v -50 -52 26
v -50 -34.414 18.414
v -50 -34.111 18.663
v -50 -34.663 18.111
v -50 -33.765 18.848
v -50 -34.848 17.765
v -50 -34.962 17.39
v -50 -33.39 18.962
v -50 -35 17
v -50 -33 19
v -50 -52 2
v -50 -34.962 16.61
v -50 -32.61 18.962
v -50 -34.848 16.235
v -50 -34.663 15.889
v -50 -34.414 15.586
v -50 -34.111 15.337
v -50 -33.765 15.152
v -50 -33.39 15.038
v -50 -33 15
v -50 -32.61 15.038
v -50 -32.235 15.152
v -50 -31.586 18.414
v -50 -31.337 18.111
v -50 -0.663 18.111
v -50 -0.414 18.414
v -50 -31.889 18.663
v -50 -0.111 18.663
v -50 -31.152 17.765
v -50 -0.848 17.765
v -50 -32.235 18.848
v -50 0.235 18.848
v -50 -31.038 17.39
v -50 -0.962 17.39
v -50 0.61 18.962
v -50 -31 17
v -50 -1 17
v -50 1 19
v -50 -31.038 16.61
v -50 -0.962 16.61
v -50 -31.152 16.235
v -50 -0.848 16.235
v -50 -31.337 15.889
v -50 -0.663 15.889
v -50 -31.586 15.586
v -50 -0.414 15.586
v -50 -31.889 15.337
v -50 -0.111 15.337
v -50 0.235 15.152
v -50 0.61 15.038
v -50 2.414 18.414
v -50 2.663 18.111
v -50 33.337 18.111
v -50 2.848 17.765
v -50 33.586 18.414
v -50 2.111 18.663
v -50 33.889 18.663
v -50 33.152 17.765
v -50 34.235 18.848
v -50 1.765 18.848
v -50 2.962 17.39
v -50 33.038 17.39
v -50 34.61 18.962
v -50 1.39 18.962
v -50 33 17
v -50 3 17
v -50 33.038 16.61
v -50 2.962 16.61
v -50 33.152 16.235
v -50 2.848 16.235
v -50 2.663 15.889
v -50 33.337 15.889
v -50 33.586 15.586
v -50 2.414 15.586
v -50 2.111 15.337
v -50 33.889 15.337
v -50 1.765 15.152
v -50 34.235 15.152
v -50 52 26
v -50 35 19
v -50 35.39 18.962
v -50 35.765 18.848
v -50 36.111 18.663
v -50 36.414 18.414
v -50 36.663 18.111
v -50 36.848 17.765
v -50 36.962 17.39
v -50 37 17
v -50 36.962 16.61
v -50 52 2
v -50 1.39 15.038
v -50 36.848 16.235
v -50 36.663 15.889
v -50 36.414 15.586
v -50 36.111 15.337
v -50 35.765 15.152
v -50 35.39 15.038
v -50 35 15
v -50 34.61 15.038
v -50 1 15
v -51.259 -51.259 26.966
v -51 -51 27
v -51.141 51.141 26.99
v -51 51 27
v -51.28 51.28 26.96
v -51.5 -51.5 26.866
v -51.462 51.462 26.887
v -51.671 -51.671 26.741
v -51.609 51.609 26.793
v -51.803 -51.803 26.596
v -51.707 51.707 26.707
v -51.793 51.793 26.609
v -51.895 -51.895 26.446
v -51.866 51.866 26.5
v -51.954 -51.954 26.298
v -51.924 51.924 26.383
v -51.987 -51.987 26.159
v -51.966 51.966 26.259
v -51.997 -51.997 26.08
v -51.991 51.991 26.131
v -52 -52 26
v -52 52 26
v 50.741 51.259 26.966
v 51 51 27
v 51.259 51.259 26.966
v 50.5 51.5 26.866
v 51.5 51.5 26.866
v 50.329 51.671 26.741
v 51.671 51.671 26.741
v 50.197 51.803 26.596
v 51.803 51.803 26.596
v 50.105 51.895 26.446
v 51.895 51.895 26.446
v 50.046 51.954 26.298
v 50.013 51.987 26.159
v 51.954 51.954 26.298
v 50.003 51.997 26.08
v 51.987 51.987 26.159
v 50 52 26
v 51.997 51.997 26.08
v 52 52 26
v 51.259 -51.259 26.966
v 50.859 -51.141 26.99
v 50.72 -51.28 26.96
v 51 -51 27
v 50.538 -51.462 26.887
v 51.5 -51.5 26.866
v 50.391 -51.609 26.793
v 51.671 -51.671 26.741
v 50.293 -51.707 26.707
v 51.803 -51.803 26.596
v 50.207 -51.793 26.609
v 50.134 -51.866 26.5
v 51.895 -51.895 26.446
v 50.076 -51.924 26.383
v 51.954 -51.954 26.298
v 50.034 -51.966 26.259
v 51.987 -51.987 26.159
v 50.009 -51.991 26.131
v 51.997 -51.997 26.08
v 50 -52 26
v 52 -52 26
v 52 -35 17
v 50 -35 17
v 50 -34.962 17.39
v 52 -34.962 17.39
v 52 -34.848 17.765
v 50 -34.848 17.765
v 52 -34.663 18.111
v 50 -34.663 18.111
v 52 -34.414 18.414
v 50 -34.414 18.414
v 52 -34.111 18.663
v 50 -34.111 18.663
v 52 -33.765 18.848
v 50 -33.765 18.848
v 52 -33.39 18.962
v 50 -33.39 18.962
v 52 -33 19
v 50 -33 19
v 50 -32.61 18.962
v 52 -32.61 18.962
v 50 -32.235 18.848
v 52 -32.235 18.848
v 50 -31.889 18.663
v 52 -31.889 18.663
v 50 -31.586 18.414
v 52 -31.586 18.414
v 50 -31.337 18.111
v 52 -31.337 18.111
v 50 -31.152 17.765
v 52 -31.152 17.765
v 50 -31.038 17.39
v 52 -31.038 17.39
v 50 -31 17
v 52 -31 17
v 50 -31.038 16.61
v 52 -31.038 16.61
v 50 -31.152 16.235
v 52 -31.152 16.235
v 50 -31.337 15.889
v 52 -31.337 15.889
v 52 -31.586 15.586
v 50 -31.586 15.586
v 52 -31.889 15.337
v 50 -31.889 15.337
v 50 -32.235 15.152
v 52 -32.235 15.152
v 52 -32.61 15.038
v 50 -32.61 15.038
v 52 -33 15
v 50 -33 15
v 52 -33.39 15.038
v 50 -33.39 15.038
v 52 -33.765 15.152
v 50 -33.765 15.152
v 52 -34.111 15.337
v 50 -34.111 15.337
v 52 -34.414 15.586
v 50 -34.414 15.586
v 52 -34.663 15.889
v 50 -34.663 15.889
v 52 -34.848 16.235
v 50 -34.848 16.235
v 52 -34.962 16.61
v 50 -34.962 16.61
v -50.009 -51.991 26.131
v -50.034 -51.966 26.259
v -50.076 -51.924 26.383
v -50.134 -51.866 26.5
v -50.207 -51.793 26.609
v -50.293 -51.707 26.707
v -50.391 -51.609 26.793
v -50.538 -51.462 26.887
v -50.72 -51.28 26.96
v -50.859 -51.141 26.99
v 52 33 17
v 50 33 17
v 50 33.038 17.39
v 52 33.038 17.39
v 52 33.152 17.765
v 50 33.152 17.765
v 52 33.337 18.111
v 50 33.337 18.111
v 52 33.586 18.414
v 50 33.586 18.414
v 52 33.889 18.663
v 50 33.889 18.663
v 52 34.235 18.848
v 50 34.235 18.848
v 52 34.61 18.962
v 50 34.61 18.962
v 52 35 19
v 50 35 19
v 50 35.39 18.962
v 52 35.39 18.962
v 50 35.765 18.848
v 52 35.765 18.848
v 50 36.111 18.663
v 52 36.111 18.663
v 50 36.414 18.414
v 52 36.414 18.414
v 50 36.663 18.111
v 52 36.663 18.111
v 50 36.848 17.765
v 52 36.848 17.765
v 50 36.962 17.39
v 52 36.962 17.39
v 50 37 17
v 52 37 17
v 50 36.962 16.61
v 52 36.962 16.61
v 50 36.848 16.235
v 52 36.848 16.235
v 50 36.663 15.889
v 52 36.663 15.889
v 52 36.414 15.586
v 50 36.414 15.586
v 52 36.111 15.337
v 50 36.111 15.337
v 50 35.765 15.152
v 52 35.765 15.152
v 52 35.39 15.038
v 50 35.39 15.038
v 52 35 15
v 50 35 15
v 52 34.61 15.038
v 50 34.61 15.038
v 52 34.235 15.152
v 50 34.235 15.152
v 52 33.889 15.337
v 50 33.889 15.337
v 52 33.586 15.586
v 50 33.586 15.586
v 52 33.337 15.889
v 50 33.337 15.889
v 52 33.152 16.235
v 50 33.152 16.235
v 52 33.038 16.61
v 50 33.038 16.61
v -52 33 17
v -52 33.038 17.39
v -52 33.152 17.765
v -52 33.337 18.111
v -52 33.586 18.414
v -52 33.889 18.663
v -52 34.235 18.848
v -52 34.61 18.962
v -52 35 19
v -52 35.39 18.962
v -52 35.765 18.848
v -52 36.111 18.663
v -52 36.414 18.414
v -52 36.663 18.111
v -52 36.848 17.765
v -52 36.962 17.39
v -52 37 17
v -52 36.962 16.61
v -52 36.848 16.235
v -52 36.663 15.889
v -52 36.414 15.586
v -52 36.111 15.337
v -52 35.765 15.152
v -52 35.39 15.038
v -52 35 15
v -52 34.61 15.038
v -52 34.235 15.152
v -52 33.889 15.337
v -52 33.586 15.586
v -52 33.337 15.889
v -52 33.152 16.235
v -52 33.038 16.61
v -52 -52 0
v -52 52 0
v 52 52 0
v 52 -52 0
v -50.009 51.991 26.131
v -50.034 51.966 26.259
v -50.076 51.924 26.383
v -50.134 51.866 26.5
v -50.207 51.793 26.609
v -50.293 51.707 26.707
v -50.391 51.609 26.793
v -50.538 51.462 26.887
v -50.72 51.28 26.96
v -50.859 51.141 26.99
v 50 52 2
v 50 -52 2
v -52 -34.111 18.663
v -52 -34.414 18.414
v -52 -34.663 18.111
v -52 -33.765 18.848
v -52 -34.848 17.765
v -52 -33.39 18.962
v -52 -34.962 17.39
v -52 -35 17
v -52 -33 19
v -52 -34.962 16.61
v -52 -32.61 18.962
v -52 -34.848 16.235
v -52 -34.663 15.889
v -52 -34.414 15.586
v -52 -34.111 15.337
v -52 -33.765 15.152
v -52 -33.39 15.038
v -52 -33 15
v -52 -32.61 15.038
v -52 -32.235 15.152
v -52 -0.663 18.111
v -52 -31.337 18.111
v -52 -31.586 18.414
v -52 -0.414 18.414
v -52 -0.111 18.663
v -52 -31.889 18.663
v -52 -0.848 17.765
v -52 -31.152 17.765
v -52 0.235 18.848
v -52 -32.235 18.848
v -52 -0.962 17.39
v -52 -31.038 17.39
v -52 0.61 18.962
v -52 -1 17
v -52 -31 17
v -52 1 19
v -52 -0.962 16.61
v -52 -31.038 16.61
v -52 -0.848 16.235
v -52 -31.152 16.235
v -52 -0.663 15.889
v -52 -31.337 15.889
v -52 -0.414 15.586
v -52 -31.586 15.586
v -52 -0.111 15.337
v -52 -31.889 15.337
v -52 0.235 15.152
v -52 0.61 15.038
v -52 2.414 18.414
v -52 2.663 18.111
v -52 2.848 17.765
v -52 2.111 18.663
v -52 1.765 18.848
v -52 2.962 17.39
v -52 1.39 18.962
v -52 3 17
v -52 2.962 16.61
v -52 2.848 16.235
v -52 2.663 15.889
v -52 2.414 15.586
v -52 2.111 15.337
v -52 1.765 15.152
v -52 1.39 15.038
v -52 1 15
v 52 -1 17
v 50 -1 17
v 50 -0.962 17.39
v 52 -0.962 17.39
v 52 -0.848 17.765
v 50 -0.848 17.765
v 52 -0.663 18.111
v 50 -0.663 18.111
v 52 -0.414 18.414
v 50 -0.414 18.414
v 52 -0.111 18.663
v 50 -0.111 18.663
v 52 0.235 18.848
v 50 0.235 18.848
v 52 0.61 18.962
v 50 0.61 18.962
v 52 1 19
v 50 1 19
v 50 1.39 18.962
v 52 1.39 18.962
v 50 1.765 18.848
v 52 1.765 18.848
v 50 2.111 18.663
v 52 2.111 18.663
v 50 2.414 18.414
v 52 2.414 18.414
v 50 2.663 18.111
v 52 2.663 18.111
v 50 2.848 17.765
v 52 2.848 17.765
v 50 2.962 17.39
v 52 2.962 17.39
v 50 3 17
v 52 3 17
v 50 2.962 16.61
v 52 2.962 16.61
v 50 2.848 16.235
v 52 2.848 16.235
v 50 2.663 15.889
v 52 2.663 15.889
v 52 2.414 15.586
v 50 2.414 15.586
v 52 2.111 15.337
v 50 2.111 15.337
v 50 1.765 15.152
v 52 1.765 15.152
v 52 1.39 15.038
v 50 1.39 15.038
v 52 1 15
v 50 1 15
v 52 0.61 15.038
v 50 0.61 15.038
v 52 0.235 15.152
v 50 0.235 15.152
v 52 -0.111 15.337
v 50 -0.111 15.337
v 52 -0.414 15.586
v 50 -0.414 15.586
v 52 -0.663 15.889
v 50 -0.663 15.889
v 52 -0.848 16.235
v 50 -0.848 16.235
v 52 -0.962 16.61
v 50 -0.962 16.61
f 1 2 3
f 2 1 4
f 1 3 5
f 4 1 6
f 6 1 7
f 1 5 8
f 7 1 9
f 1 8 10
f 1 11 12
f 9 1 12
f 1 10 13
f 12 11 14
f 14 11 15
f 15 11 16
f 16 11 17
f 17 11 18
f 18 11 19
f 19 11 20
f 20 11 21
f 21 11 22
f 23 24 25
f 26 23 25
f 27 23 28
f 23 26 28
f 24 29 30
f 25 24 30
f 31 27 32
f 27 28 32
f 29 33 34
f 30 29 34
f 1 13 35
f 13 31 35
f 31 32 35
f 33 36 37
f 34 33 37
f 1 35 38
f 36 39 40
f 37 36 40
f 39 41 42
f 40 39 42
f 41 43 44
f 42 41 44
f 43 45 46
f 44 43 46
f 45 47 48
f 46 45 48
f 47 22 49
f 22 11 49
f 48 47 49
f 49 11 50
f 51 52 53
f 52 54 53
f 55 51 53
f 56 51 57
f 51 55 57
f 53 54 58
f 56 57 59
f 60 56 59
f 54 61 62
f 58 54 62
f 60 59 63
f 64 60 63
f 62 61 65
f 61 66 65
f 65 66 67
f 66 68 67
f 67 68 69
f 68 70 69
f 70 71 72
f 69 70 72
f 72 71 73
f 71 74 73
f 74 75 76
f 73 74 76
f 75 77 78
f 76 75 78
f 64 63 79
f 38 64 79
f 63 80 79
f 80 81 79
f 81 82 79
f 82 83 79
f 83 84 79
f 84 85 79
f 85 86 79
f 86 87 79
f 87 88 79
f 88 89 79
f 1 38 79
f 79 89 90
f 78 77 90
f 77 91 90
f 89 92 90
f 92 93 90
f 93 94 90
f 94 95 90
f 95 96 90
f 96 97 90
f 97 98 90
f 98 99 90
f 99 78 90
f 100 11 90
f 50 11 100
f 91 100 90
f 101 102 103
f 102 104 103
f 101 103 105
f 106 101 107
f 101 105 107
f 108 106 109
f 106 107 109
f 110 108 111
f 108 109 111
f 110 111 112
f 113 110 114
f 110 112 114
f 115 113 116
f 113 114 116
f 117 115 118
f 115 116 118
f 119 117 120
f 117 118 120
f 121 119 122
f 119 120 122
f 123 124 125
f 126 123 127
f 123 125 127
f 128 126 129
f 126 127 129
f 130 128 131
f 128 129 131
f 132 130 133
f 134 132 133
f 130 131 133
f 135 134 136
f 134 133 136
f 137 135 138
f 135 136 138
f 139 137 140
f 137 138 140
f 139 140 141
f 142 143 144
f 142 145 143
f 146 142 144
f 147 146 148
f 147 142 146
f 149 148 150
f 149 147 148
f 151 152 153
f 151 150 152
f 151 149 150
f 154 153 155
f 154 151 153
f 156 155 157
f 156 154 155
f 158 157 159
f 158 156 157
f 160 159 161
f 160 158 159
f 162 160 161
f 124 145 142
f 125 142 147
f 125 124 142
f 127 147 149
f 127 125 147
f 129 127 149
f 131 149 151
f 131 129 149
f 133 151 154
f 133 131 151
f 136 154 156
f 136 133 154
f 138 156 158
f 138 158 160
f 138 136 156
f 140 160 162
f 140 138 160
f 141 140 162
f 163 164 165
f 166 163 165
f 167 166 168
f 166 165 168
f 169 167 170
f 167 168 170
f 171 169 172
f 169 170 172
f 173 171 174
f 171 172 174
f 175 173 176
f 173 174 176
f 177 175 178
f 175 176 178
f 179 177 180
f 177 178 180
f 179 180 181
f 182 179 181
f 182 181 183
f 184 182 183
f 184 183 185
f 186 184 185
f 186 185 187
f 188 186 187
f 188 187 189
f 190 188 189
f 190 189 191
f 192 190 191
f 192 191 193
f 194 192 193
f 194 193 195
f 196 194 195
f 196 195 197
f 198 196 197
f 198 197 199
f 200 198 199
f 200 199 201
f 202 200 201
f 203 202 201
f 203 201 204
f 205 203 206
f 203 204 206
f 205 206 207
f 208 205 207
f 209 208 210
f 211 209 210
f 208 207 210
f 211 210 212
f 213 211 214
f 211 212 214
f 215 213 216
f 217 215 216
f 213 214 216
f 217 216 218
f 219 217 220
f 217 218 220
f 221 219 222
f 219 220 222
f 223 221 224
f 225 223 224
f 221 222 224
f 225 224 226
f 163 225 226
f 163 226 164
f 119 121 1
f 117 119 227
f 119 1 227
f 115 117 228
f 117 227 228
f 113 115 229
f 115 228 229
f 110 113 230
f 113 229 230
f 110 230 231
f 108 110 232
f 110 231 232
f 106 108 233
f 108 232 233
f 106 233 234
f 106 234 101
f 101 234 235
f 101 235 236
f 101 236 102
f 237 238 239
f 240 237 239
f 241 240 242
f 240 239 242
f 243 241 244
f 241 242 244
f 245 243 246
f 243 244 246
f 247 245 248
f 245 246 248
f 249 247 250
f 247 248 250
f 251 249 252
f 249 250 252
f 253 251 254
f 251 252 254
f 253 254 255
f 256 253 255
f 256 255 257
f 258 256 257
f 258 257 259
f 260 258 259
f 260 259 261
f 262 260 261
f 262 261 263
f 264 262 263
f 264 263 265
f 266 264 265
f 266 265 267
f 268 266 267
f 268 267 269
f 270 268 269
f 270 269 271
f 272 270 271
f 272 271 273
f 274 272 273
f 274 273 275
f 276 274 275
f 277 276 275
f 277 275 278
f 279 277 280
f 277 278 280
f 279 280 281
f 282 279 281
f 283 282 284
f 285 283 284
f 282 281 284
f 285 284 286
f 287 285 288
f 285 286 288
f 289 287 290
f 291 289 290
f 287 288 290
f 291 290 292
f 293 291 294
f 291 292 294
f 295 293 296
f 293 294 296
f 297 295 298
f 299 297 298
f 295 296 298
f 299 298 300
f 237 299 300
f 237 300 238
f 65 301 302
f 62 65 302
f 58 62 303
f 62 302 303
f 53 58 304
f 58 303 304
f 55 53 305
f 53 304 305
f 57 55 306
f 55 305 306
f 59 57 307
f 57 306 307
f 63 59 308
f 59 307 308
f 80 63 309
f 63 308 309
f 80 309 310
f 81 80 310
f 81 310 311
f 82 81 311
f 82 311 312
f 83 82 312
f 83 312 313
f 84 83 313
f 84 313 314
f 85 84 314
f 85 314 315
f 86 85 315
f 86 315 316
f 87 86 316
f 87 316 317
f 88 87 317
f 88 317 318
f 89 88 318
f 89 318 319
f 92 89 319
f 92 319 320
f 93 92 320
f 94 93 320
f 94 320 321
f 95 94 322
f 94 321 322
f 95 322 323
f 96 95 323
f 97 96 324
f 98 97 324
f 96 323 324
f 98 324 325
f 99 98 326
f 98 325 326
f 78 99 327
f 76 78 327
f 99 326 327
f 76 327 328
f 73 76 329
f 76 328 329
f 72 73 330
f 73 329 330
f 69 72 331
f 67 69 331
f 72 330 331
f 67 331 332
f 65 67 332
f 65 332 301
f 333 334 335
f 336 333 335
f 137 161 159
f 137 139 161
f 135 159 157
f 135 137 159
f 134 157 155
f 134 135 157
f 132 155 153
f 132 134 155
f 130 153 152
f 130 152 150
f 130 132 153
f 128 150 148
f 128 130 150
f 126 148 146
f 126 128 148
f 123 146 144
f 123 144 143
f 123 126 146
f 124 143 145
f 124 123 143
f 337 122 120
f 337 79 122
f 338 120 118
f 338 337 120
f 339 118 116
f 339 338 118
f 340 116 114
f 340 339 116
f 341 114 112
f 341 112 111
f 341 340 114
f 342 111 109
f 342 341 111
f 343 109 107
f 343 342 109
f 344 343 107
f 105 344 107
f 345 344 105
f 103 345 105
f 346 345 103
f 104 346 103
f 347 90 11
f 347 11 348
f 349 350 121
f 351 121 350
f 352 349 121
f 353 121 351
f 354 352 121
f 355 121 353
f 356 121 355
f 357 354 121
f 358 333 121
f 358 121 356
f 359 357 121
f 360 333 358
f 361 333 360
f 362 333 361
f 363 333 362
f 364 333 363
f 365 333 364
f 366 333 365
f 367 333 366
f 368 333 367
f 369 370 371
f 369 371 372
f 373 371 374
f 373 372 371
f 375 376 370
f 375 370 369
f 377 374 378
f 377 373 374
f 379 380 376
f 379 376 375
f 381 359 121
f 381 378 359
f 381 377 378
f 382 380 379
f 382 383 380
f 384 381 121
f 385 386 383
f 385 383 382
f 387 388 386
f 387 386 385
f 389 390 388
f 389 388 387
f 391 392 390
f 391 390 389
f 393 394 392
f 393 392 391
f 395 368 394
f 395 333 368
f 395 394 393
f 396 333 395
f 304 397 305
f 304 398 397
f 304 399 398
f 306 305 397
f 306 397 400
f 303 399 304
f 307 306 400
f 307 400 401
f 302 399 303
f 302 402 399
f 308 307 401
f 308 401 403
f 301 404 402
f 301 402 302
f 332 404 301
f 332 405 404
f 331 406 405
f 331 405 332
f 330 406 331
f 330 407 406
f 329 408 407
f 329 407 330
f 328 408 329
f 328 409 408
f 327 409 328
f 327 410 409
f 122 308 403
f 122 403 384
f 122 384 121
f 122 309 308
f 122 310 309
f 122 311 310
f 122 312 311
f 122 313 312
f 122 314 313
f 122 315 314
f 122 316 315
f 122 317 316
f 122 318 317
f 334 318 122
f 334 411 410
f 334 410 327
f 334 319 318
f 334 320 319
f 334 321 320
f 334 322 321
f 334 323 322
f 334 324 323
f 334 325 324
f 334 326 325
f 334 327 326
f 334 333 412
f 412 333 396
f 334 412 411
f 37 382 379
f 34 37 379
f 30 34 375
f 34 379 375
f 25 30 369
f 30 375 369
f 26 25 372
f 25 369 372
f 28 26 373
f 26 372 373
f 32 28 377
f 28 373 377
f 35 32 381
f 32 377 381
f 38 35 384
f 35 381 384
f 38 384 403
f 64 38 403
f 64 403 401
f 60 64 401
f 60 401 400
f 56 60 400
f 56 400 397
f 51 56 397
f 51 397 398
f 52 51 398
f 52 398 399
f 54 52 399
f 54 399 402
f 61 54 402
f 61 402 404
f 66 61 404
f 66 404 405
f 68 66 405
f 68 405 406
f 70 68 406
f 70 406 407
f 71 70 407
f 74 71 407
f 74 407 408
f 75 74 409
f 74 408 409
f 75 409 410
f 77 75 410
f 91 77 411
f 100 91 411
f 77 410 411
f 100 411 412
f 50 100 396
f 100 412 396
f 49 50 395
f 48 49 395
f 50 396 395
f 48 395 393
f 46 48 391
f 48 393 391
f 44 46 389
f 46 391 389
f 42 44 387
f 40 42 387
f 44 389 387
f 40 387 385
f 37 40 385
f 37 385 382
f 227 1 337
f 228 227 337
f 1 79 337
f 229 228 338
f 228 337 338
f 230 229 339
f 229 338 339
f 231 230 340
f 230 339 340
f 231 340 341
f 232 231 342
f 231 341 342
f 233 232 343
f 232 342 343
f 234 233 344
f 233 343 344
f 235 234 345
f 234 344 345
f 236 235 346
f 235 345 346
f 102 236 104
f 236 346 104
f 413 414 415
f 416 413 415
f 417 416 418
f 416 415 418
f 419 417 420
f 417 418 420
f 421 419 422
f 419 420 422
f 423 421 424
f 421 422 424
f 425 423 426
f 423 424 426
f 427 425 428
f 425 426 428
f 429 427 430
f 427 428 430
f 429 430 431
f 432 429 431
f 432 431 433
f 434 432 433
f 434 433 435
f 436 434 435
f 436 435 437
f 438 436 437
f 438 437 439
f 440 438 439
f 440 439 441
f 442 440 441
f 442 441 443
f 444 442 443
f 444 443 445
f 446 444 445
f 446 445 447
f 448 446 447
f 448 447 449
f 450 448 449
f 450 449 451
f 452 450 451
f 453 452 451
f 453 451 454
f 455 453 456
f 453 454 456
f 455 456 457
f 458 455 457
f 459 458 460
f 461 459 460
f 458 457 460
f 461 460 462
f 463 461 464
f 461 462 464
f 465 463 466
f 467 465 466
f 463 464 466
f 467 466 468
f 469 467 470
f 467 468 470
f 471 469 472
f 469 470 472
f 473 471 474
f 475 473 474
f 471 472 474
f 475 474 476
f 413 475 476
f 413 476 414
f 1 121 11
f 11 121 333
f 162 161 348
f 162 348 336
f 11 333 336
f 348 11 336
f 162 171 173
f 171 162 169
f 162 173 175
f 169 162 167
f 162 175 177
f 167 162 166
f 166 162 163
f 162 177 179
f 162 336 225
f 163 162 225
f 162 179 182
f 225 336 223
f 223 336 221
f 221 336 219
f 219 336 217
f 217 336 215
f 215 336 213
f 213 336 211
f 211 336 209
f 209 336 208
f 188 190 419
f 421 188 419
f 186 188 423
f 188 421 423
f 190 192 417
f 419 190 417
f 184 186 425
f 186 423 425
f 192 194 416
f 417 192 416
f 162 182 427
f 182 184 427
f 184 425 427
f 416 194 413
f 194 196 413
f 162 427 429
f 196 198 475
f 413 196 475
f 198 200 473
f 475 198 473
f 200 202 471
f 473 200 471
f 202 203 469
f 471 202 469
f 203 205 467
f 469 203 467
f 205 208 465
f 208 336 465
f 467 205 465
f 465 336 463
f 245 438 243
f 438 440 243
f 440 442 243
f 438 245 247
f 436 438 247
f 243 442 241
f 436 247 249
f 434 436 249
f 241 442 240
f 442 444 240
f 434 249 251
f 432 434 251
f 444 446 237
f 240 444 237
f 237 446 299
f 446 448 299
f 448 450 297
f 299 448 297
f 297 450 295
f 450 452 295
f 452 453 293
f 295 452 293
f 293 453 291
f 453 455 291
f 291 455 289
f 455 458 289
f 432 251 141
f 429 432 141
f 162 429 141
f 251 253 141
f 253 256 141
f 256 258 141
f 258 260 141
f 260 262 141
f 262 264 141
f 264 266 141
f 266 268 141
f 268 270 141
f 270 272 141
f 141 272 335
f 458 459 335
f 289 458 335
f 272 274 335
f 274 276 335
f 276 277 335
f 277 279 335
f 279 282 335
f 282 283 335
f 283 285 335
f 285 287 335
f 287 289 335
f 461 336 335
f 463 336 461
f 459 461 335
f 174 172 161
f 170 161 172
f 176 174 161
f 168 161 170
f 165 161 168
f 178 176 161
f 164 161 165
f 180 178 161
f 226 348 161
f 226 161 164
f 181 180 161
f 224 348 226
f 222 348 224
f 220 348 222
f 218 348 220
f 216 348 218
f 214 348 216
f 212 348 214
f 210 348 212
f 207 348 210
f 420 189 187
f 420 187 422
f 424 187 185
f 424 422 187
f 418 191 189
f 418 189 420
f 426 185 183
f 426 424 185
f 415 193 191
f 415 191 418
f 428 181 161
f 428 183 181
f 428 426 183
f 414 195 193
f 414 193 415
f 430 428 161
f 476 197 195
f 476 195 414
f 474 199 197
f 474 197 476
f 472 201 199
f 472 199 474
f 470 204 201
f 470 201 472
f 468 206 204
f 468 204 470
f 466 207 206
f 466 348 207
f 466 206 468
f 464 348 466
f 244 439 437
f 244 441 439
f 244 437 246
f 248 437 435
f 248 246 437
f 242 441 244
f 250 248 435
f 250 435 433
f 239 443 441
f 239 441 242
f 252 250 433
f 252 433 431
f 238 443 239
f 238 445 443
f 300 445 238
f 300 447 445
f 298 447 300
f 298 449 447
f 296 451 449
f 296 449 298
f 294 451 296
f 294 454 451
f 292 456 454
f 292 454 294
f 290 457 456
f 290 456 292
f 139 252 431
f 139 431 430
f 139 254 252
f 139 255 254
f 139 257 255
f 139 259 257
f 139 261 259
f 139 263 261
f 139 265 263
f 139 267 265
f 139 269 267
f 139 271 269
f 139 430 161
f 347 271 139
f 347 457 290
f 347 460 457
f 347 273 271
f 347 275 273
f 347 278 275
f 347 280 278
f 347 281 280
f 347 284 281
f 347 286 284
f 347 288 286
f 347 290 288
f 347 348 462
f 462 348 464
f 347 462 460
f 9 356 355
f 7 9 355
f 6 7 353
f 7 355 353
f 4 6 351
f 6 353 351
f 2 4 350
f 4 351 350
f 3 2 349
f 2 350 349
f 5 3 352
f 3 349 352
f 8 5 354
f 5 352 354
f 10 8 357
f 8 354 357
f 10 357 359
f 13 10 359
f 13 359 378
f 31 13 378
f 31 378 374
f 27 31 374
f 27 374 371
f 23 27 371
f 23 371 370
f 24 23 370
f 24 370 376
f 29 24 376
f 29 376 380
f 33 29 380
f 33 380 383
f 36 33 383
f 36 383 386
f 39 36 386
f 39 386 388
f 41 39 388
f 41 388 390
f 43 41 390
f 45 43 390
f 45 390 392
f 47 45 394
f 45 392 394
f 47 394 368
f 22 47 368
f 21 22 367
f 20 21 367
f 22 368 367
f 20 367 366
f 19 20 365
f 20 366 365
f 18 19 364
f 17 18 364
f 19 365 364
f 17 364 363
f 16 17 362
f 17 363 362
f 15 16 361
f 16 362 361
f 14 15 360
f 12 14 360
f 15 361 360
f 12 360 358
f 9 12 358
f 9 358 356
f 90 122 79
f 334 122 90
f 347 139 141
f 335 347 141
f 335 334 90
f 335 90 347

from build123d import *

# Parameters (mm, degrees)
F0_W     = 104
F0_H     = 104
F1_DEPTH = 2
F2_W     = 2
F2_H     = 104
F3_DEPTH = 25
F4_W     = 2
F4_H     = 104
F5_DEPTH = 25
F6_R     = 0.99999
F7_R     = 0.99999
F9_D     = 4
F11_D    = 4
F13_D    = 4


# Not quite as in the source:
# - a fillet or chamfer is up to 0.001 mm smaller than in the source, because OpenCascade refuses the exact size


with BuildPart() as f1:
    # F0 (on Top) → F1 (new body)
    with BuildSketch(Plane.XY):
        Rectangle(F0_W, F0_H)
    extrude(amount=F1_DEPTH)

    # F2 (on face) → F3 (join)
    with BuildSketch(Plane.XY.offset(2)):
        with Locations((-51, 0)):
            Rectangle(F2_W, F2_H)
    extrude(amount=F3_DEPTH)

    # F4 (on face) → F5 (join)
    with BuildSketch(Plane.XY.offset(2)):
        with Locations((51, 0)):
            Rectangle(F4_W, F4_H)
    extrude(amount=F5_DEPTH)

    # F6 (radius 1 in the source; OpenCascade refuses exactly that, so slightly less here)
    f6_edges = [f1.edges().sort_by_distance(p)[0] for p in [
        (52, 0, 27),
        (51, 52, 27),
        (50, 0, 27),
        (51, -52, 27),
    ]]
    fillet(f6_edges, radius=F6_R)

    # F7 (radius 1 in the source; OpenCascade refuses exactly that, so slightly less here)
    f7_edges = [f1.edges().sort_by_distance(p)[0] for p in [
        (-51, 52, 27),
        (-52, 0, 27),
        (-51, -52, 27),
        (-50, 0, 27),
    ]]
    fillet(f7_edges, radius=F7_R)

    # F9 (through all)
    with Locations(Plane.YZ.offset(52)):
        with Locations((-33, 17)):
            Hole(F9_D / 2)

    # F11 (through all)
    with Locations(Plane.YZ.offset(52)):
        with Locations((1, 17)):
            Hole(F11_D / 2)

    # F13 (through all)
    with Locations(Plane.YZ.offset(52)):
        with Locations((35, 17)):
            Hole(F13_D / 2)


solid = f1.part
